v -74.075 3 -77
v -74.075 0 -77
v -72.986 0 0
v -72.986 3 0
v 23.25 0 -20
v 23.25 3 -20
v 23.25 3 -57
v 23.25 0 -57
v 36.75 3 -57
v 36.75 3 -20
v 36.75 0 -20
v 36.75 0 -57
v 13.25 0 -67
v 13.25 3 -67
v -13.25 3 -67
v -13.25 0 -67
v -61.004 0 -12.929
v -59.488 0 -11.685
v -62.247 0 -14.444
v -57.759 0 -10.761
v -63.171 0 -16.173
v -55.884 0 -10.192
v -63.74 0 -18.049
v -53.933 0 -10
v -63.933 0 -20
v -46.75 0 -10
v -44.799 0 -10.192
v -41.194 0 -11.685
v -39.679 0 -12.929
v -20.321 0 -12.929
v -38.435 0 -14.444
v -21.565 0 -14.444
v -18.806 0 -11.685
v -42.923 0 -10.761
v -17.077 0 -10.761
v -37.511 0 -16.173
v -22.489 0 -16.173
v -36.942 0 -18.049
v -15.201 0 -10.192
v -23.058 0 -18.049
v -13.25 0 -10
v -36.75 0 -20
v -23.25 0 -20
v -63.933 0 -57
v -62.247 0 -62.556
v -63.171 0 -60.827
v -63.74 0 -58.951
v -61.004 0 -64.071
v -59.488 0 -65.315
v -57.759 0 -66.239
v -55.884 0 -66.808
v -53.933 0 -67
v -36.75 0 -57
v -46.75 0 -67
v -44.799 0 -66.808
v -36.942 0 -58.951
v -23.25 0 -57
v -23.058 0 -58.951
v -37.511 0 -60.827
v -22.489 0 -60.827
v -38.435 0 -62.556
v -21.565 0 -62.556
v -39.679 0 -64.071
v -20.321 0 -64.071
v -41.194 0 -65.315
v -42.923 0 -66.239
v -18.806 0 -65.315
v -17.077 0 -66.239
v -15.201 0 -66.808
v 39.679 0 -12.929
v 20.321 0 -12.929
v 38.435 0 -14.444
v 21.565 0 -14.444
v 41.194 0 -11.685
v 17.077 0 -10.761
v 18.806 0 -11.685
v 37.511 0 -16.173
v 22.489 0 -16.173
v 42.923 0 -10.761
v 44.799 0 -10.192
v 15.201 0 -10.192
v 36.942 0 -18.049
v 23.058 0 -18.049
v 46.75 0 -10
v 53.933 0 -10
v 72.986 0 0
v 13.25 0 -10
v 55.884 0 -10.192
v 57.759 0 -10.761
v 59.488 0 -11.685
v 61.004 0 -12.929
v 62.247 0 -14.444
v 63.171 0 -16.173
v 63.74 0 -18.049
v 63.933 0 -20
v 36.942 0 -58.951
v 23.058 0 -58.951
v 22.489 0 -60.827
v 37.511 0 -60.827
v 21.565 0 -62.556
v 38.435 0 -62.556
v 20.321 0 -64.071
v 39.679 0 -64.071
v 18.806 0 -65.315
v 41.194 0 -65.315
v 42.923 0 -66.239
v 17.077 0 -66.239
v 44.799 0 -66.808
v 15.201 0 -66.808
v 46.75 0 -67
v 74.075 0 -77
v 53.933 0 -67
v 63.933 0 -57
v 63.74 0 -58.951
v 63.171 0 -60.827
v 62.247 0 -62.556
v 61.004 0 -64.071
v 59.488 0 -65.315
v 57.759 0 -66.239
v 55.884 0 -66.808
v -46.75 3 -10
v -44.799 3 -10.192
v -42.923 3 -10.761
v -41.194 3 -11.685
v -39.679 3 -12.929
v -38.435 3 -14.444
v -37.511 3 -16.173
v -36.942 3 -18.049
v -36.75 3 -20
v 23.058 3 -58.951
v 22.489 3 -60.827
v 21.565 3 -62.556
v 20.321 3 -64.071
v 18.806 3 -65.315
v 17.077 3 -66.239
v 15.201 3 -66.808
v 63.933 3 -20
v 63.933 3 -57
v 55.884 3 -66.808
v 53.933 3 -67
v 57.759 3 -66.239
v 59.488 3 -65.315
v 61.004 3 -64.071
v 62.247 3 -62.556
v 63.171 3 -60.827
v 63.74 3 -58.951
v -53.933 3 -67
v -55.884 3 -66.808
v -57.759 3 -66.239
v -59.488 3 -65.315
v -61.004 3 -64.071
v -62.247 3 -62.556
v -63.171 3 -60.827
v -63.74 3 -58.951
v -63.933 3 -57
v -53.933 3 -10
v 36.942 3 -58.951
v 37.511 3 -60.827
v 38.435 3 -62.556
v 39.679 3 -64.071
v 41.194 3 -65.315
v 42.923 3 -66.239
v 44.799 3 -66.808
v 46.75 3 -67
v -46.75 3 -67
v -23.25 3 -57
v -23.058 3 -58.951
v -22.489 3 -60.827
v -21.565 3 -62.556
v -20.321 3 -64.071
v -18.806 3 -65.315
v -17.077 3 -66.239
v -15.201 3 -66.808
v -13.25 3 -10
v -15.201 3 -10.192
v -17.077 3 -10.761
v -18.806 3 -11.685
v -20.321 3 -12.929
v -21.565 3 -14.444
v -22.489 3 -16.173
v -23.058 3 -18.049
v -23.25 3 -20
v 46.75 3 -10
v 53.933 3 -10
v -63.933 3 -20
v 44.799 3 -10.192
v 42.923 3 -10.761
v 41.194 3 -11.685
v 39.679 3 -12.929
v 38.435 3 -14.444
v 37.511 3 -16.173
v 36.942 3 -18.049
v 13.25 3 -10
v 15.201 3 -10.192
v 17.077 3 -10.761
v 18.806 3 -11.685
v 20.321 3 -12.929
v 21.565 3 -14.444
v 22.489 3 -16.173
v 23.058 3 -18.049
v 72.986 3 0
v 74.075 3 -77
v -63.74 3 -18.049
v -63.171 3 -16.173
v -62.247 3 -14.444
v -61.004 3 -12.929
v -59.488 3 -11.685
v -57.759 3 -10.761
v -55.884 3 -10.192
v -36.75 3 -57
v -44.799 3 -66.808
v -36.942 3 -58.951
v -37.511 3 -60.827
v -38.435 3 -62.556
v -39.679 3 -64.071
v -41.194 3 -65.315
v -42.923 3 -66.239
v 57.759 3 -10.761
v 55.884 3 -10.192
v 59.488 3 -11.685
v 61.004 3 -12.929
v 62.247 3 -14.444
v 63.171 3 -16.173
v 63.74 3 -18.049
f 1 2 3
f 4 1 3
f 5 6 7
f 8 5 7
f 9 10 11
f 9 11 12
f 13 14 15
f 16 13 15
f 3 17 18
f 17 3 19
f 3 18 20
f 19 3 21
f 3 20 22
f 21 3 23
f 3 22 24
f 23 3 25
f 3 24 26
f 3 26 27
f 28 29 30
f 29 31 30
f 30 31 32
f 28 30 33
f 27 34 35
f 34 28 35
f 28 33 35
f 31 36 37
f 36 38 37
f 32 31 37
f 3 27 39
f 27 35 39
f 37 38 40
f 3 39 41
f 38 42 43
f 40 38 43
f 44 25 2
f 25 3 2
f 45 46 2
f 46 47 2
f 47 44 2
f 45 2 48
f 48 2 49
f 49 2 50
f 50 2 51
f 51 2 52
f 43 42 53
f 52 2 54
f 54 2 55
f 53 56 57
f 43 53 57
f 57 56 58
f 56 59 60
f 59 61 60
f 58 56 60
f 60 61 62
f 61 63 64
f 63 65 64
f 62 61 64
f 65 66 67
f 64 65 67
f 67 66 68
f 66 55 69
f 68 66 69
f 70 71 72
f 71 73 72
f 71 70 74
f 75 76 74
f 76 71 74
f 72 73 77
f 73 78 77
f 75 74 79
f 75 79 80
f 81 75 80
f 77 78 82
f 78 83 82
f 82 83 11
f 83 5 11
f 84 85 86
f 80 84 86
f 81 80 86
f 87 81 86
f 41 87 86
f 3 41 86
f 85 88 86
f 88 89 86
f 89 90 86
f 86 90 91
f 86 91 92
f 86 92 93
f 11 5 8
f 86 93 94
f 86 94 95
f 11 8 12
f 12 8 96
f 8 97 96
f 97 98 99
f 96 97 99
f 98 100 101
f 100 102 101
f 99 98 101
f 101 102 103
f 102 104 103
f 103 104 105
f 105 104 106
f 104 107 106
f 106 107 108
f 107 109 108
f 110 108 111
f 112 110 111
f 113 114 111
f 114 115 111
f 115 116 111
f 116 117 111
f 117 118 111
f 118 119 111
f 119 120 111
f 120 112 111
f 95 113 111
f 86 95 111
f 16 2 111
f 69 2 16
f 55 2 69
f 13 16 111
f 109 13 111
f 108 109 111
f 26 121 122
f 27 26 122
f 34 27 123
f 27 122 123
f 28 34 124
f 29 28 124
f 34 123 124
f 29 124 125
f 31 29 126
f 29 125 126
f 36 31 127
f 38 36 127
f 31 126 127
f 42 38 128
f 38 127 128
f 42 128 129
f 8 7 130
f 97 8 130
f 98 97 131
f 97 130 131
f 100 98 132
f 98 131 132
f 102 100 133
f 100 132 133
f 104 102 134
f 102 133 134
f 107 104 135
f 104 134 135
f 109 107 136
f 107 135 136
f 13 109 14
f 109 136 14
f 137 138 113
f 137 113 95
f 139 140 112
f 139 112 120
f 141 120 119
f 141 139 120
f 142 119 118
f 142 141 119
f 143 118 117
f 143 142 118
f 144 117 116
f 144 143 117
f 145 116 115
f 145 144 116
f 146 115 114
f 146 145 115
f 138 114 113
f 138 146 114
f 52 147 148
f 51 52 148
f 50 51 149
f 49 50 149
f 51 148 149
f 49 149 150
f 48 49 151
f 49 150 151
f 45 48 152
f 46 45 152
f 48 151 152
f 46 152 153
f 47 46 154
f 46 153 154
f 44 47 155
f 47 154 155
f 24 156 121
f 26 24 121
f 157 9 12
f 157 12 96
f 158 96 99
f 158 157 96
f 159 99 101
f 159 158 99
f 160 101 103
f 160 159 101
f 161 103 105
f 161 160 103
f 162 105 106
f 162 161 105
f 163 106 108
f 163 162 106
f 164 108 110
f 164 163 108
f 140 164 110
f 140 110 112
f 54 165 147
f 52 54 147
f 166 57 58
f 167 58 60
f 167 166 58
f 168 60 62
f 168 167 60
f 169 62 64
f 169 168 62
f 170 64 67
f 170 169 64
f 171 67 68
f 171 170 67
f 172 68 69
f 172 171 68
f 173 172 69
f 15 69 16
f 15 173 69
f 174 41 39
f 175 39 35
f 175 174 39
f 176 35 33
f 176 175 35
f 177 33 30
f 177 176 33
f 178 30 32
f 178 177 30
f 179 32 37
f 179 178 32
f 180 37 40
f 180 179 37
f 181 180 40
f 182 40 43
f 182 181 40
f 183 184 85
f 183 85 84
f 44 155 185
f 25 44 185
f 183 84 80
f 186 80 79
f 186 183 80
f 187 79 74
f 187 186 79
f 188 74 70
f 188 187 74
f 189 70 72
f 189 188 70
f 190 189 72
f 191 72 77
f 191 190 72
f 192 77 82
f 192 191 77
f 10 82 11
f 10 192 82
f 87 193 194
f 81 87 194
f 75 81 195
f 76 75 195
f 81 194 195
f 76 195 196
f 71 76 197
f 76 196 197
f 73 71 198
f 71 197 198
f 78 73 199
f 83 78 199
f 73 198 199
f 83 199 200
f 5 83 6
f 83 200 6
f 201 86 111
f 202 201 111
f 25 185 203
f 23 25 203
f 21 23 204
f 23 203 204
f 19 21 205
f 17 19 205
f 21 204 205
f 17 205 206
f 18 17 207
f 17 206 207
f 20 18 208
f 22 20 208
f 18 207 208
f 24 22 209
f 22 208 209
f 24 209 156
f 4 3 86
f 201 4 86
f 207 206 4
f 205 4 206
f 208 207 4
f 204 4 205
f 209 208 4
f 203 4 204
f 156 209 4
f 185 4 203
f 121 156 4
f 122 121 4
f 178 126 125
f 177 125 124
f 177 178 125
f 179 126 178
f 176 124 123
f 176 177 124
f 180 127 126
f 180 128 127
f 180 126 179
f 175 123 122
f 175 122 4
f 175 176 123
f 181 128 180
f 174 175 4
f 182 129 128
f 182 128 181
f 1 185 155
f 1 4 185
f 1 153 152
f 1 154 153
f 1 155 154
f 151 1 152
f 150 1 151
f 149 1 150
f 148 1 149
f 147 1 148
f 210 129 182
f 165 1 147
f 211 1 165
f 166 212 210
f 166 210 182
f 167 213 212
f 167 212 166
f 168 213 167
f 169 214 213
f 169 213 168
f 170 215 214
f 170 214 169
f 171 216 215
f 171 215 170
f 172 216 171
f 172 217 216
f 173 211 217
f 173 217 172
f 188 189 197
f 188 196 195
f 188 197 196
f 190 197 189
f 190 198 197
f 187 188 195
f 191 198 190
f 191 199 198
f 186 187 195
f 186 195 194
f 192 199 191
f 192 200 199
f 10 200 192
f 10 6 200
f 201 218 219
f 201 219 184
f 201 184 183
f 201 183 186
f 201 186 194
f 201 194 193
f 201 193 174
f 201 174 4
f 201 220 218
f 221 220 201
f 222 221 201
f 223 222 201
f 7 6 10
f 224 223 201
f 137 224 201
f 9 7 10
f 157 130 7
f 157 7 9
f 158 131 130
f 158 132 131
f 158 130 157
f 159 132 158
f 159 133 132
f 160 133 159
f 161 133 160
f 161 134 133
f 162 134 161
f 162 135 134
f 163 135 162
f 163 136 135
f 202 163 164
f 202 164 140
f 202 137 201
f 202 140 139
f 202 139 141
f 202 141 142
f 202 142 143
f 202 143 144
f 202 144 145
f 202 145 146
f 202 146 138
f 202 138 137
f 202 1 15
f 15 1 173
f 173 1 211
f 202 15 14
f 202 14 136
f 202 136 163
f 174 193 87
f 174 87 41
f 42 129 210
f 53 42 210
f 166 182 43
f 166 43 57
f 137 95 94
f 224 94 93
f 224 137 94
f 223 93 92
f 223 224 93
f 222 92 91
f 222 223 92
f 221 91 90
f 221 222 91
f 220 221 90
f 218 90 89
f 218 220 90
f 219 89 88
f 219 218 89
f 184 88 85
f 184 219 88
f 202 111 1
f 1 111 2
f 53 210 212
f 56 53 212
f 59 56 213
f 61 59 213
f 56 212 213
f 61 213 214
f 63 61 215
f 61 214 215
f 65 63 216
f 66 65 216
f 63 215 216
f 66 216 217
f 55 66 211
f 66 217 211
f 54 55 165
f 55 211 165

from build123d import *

# Parameters (mm, degrees)
BOSS_EXTRUDE1_DEPTH = 3
CUT_EXTRUDE1_DEPTH  = 10


with BuildPart() as part:
    # Sketch1 → Boss-Extrude1 (new body)
    with BuildSketch(Plane(origin=(0, 0, 0), x_dir=(1, 0, 0), z_dir=(0, 1, 0))):
        Polygon((-72.98636562, 0), (72.98636562, 0), (74.075, 77), (-74.075, 77), align=None)
    extrude(amount=BOSS_EXTRUDE1_DEPTH)

    # Sketch2 → Cut-Extrude1 (cut)
    with BuildSketch(Plane(origin=(0, 3, 0), x_dir=(1, 0, 0), z_dir=(0, 1, 0))):
        with BuildLine():
            Line((-46.75, 67), (-53.932619531, 67))
            ThreePointArc((-53.932619531, 67), (-61.003687343, 64.071067812), (-63.932619531, 57))
            Line((-63.932619531, 57), (-63.932619531, 20))
            ThreePointArc((-63.932619531, 20), (-61.003687343, 12.928932188), (-53.932619531, 10))
            Line((-53.932619531, 10), (-46.75, 10))
            ThreePointArc((-46.75, 10), (-39.678932188, 12.928932188), (-36.75, 20))
            Line((-36.75, 20), (-36.75, 57))
            ThreePointArc((-36.75, 57), (-39.678932188, 64.071067812), (-46.75, 67))
        make_face()
        with BuildLine():
            Line((-13.25, 67), (0, 67))
            Line((0, 67), (0, 10))
            Line((0, 10), (-13.25, 10))
            ThreePointArc((-13.25, 10), (-20.321067812, 12.928932188), (-23.25, 20))
            Line((-23.25, 20), (-23.25, 57))
            ThreePointArc((-23.25, 57), (-20.321067812, 64.071067812), (-13.25, 67))
        make_face()
    cut_extrude1 = extrude(amount=-CUT_EXTRUDE1_DEPTH, mode=Mode.SUBTRACT)

    # Mirror1: Cut-Extrude1 across plane
    add(cut_extrude1.mirror(Plane(origin=(0, 0, 0), x_dir=(0, 0, 1), z_dir=(1, 0, 0))), mode=Mode.SUBTRACT)


solid = part.part
